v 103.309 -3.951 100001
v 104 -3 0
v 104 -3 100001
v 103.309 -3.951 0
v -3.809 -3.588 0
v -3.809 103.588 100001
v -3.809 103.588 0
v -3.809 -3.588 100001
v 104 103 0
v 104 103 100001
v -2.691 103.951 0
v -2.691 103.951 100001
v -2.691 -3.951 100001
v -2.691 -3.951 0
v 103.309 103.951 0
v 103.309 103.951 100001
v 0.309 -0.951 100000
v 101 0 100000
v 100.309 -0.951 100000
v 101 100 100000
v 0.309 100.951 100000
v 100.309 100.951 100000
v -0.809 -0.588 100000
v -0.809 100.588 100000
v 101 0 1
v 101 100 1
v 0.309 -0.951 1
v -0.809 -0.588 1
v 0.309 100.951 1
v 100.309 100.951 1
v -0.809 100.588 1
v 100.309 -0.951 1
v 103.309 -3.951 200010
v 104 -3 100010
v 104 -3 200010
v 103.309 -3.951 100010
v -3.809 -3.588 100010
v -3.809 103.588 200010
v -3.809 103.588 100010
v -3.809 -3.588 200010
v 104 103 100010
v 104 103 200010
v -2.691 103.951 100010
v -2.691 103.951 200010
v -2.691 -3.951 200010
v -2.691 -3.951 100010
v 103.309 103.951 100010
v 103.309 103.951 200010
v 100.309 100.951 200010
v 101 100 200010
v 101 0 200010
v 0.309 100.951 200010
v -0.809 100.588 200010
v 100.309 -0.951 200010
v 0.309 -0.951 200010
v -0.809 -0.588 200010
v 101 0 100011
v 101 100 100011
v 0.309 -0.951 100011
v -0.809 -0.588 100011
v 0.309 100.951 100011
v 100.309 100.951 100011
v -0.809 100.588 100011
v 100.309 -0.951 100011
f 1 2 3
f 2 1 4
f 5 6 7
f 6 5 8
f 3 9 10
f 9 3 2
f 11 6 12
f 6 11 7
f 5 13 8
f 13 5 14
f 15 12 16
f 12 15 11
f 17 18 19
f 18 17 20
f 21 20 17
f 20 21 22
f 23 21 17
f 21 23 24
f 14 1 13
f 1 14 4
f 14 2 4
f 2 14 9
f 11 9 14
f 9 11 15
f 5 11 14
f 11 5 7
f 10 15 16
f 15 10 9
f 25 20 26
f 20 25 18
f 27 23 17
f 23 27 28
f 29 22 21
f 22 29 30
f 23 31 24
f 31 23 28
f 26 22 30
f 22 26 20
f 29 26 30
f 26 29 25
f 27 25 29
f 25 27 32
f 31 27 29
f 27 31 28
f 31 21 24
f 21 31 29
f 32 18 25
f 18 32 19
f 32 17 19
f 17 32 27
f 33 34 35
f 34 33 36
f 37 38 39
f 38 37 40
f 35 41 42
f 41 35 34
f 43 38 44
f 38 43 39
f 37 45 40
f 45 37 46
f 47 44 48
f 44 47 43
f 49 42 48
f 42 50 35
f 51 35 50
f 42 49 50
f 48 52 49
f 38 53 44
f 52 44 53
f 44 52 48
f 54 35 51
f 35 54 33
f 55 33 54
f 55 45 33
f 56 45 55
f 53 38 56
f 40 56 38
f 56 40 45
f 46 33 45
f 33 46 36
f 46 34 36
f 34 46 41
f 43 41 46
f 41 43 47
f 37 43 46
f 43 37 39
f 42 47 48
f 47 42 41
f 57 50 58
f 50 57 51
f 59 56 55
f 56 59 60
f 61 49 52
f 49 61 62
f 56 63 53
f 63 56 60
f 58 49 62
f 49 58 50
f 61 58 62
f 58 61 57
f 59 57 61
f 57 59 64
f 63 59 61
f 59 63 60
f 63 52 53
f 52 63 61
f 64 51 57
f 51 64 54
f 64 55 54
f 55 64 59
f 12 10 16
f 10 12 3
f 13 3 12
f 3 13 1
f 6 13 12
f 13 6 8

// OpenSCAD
module case (width, length, wall_height, wall_thickness, x_offset, y_offset, z_offset){
    //Negative space
    top_right_point = [width + x_offset, length + y_offset, z_offset];
    top_left_point = [width + x_offset, y_offset, z_offset];
    bottom_right_point = [x_offset, length + y_offset, z_offset];
    bottom_left_point = [x_offset, y_offset, z_offset];

    //Base space
    top_right_point_base = [width + wall_thickness, length + wall_thickness, 0];
    top_left_point_base = [width + wall_thickness, -wall_thickness, 0];
    bottom_right_point_base = [-wall_thickness, length + wall_thickness, 0];
    bottom_left_point_base = [-wall_thickness, -wall_thickness, 0];
    
    //Lists for the for loops
    base_points = [top_right_point_base, top_left_point_base, bottom_right_point_base, bottom_left_point_base];
    points = [top_right_point, top_left_point, bottom_right_point, bottom_left_point];

    difference(){
        hull(){
            for (point = base_points){
                translate(point){
                    cylinder(wall_height);
                }
            }
        }
        hull(){
            for (point = points){
                translate(point){
                    cylinder(wall_height);
                }
            }
        }
    }
}

module roofed_case(width, length, wall_height, wall_thickness, x_offset, y_offset, z_offset, roof_thickness){
    case(width, length, wall_height, wall_thickness, x_offset, y_offset, z_offset);
    top_right_point_base = [width + wall_thickness, length + wall_thickness, wall_height];
    top_left_point_base = [width + wall_thickness, -wall_thickness, wall_height ];
    bottom_right_point_base = [-wall_thickness, length + wall_thickness, wall_height];
    bottom_left_point_base = [-wall_thickness, -wall_thickness, wall_height];
    points = [top_right_point_base, top_left_point_base, bottom_right_point_base, bottom_left_point_base];
    hull(){
           for(point = points){
               translate(point) cylinder(roof_thickness);
           }
    }
    
}

//Changeable values
width = 100;
length = 100;
wall_height = 100000;
x_offset = 0;
y_offset = 0;
z_offset = 1;
wall_thickness = 3;
roof_thickness = 3;

/*
//Non-changeable values
height = z_offset + wall_height;
*/

//This is for making sure it renders correctly
translate([0, 0, wall_height + 10]){
    case(width,
        length,
        wall_height,
        wall_thickness,
        x_offset,
        y_offset,
        z_offset);
}

roofed_case(width,
     length,
     wall_height,
     wall_thickness,
     x_offset,
     y_offset,
     z_offset);
